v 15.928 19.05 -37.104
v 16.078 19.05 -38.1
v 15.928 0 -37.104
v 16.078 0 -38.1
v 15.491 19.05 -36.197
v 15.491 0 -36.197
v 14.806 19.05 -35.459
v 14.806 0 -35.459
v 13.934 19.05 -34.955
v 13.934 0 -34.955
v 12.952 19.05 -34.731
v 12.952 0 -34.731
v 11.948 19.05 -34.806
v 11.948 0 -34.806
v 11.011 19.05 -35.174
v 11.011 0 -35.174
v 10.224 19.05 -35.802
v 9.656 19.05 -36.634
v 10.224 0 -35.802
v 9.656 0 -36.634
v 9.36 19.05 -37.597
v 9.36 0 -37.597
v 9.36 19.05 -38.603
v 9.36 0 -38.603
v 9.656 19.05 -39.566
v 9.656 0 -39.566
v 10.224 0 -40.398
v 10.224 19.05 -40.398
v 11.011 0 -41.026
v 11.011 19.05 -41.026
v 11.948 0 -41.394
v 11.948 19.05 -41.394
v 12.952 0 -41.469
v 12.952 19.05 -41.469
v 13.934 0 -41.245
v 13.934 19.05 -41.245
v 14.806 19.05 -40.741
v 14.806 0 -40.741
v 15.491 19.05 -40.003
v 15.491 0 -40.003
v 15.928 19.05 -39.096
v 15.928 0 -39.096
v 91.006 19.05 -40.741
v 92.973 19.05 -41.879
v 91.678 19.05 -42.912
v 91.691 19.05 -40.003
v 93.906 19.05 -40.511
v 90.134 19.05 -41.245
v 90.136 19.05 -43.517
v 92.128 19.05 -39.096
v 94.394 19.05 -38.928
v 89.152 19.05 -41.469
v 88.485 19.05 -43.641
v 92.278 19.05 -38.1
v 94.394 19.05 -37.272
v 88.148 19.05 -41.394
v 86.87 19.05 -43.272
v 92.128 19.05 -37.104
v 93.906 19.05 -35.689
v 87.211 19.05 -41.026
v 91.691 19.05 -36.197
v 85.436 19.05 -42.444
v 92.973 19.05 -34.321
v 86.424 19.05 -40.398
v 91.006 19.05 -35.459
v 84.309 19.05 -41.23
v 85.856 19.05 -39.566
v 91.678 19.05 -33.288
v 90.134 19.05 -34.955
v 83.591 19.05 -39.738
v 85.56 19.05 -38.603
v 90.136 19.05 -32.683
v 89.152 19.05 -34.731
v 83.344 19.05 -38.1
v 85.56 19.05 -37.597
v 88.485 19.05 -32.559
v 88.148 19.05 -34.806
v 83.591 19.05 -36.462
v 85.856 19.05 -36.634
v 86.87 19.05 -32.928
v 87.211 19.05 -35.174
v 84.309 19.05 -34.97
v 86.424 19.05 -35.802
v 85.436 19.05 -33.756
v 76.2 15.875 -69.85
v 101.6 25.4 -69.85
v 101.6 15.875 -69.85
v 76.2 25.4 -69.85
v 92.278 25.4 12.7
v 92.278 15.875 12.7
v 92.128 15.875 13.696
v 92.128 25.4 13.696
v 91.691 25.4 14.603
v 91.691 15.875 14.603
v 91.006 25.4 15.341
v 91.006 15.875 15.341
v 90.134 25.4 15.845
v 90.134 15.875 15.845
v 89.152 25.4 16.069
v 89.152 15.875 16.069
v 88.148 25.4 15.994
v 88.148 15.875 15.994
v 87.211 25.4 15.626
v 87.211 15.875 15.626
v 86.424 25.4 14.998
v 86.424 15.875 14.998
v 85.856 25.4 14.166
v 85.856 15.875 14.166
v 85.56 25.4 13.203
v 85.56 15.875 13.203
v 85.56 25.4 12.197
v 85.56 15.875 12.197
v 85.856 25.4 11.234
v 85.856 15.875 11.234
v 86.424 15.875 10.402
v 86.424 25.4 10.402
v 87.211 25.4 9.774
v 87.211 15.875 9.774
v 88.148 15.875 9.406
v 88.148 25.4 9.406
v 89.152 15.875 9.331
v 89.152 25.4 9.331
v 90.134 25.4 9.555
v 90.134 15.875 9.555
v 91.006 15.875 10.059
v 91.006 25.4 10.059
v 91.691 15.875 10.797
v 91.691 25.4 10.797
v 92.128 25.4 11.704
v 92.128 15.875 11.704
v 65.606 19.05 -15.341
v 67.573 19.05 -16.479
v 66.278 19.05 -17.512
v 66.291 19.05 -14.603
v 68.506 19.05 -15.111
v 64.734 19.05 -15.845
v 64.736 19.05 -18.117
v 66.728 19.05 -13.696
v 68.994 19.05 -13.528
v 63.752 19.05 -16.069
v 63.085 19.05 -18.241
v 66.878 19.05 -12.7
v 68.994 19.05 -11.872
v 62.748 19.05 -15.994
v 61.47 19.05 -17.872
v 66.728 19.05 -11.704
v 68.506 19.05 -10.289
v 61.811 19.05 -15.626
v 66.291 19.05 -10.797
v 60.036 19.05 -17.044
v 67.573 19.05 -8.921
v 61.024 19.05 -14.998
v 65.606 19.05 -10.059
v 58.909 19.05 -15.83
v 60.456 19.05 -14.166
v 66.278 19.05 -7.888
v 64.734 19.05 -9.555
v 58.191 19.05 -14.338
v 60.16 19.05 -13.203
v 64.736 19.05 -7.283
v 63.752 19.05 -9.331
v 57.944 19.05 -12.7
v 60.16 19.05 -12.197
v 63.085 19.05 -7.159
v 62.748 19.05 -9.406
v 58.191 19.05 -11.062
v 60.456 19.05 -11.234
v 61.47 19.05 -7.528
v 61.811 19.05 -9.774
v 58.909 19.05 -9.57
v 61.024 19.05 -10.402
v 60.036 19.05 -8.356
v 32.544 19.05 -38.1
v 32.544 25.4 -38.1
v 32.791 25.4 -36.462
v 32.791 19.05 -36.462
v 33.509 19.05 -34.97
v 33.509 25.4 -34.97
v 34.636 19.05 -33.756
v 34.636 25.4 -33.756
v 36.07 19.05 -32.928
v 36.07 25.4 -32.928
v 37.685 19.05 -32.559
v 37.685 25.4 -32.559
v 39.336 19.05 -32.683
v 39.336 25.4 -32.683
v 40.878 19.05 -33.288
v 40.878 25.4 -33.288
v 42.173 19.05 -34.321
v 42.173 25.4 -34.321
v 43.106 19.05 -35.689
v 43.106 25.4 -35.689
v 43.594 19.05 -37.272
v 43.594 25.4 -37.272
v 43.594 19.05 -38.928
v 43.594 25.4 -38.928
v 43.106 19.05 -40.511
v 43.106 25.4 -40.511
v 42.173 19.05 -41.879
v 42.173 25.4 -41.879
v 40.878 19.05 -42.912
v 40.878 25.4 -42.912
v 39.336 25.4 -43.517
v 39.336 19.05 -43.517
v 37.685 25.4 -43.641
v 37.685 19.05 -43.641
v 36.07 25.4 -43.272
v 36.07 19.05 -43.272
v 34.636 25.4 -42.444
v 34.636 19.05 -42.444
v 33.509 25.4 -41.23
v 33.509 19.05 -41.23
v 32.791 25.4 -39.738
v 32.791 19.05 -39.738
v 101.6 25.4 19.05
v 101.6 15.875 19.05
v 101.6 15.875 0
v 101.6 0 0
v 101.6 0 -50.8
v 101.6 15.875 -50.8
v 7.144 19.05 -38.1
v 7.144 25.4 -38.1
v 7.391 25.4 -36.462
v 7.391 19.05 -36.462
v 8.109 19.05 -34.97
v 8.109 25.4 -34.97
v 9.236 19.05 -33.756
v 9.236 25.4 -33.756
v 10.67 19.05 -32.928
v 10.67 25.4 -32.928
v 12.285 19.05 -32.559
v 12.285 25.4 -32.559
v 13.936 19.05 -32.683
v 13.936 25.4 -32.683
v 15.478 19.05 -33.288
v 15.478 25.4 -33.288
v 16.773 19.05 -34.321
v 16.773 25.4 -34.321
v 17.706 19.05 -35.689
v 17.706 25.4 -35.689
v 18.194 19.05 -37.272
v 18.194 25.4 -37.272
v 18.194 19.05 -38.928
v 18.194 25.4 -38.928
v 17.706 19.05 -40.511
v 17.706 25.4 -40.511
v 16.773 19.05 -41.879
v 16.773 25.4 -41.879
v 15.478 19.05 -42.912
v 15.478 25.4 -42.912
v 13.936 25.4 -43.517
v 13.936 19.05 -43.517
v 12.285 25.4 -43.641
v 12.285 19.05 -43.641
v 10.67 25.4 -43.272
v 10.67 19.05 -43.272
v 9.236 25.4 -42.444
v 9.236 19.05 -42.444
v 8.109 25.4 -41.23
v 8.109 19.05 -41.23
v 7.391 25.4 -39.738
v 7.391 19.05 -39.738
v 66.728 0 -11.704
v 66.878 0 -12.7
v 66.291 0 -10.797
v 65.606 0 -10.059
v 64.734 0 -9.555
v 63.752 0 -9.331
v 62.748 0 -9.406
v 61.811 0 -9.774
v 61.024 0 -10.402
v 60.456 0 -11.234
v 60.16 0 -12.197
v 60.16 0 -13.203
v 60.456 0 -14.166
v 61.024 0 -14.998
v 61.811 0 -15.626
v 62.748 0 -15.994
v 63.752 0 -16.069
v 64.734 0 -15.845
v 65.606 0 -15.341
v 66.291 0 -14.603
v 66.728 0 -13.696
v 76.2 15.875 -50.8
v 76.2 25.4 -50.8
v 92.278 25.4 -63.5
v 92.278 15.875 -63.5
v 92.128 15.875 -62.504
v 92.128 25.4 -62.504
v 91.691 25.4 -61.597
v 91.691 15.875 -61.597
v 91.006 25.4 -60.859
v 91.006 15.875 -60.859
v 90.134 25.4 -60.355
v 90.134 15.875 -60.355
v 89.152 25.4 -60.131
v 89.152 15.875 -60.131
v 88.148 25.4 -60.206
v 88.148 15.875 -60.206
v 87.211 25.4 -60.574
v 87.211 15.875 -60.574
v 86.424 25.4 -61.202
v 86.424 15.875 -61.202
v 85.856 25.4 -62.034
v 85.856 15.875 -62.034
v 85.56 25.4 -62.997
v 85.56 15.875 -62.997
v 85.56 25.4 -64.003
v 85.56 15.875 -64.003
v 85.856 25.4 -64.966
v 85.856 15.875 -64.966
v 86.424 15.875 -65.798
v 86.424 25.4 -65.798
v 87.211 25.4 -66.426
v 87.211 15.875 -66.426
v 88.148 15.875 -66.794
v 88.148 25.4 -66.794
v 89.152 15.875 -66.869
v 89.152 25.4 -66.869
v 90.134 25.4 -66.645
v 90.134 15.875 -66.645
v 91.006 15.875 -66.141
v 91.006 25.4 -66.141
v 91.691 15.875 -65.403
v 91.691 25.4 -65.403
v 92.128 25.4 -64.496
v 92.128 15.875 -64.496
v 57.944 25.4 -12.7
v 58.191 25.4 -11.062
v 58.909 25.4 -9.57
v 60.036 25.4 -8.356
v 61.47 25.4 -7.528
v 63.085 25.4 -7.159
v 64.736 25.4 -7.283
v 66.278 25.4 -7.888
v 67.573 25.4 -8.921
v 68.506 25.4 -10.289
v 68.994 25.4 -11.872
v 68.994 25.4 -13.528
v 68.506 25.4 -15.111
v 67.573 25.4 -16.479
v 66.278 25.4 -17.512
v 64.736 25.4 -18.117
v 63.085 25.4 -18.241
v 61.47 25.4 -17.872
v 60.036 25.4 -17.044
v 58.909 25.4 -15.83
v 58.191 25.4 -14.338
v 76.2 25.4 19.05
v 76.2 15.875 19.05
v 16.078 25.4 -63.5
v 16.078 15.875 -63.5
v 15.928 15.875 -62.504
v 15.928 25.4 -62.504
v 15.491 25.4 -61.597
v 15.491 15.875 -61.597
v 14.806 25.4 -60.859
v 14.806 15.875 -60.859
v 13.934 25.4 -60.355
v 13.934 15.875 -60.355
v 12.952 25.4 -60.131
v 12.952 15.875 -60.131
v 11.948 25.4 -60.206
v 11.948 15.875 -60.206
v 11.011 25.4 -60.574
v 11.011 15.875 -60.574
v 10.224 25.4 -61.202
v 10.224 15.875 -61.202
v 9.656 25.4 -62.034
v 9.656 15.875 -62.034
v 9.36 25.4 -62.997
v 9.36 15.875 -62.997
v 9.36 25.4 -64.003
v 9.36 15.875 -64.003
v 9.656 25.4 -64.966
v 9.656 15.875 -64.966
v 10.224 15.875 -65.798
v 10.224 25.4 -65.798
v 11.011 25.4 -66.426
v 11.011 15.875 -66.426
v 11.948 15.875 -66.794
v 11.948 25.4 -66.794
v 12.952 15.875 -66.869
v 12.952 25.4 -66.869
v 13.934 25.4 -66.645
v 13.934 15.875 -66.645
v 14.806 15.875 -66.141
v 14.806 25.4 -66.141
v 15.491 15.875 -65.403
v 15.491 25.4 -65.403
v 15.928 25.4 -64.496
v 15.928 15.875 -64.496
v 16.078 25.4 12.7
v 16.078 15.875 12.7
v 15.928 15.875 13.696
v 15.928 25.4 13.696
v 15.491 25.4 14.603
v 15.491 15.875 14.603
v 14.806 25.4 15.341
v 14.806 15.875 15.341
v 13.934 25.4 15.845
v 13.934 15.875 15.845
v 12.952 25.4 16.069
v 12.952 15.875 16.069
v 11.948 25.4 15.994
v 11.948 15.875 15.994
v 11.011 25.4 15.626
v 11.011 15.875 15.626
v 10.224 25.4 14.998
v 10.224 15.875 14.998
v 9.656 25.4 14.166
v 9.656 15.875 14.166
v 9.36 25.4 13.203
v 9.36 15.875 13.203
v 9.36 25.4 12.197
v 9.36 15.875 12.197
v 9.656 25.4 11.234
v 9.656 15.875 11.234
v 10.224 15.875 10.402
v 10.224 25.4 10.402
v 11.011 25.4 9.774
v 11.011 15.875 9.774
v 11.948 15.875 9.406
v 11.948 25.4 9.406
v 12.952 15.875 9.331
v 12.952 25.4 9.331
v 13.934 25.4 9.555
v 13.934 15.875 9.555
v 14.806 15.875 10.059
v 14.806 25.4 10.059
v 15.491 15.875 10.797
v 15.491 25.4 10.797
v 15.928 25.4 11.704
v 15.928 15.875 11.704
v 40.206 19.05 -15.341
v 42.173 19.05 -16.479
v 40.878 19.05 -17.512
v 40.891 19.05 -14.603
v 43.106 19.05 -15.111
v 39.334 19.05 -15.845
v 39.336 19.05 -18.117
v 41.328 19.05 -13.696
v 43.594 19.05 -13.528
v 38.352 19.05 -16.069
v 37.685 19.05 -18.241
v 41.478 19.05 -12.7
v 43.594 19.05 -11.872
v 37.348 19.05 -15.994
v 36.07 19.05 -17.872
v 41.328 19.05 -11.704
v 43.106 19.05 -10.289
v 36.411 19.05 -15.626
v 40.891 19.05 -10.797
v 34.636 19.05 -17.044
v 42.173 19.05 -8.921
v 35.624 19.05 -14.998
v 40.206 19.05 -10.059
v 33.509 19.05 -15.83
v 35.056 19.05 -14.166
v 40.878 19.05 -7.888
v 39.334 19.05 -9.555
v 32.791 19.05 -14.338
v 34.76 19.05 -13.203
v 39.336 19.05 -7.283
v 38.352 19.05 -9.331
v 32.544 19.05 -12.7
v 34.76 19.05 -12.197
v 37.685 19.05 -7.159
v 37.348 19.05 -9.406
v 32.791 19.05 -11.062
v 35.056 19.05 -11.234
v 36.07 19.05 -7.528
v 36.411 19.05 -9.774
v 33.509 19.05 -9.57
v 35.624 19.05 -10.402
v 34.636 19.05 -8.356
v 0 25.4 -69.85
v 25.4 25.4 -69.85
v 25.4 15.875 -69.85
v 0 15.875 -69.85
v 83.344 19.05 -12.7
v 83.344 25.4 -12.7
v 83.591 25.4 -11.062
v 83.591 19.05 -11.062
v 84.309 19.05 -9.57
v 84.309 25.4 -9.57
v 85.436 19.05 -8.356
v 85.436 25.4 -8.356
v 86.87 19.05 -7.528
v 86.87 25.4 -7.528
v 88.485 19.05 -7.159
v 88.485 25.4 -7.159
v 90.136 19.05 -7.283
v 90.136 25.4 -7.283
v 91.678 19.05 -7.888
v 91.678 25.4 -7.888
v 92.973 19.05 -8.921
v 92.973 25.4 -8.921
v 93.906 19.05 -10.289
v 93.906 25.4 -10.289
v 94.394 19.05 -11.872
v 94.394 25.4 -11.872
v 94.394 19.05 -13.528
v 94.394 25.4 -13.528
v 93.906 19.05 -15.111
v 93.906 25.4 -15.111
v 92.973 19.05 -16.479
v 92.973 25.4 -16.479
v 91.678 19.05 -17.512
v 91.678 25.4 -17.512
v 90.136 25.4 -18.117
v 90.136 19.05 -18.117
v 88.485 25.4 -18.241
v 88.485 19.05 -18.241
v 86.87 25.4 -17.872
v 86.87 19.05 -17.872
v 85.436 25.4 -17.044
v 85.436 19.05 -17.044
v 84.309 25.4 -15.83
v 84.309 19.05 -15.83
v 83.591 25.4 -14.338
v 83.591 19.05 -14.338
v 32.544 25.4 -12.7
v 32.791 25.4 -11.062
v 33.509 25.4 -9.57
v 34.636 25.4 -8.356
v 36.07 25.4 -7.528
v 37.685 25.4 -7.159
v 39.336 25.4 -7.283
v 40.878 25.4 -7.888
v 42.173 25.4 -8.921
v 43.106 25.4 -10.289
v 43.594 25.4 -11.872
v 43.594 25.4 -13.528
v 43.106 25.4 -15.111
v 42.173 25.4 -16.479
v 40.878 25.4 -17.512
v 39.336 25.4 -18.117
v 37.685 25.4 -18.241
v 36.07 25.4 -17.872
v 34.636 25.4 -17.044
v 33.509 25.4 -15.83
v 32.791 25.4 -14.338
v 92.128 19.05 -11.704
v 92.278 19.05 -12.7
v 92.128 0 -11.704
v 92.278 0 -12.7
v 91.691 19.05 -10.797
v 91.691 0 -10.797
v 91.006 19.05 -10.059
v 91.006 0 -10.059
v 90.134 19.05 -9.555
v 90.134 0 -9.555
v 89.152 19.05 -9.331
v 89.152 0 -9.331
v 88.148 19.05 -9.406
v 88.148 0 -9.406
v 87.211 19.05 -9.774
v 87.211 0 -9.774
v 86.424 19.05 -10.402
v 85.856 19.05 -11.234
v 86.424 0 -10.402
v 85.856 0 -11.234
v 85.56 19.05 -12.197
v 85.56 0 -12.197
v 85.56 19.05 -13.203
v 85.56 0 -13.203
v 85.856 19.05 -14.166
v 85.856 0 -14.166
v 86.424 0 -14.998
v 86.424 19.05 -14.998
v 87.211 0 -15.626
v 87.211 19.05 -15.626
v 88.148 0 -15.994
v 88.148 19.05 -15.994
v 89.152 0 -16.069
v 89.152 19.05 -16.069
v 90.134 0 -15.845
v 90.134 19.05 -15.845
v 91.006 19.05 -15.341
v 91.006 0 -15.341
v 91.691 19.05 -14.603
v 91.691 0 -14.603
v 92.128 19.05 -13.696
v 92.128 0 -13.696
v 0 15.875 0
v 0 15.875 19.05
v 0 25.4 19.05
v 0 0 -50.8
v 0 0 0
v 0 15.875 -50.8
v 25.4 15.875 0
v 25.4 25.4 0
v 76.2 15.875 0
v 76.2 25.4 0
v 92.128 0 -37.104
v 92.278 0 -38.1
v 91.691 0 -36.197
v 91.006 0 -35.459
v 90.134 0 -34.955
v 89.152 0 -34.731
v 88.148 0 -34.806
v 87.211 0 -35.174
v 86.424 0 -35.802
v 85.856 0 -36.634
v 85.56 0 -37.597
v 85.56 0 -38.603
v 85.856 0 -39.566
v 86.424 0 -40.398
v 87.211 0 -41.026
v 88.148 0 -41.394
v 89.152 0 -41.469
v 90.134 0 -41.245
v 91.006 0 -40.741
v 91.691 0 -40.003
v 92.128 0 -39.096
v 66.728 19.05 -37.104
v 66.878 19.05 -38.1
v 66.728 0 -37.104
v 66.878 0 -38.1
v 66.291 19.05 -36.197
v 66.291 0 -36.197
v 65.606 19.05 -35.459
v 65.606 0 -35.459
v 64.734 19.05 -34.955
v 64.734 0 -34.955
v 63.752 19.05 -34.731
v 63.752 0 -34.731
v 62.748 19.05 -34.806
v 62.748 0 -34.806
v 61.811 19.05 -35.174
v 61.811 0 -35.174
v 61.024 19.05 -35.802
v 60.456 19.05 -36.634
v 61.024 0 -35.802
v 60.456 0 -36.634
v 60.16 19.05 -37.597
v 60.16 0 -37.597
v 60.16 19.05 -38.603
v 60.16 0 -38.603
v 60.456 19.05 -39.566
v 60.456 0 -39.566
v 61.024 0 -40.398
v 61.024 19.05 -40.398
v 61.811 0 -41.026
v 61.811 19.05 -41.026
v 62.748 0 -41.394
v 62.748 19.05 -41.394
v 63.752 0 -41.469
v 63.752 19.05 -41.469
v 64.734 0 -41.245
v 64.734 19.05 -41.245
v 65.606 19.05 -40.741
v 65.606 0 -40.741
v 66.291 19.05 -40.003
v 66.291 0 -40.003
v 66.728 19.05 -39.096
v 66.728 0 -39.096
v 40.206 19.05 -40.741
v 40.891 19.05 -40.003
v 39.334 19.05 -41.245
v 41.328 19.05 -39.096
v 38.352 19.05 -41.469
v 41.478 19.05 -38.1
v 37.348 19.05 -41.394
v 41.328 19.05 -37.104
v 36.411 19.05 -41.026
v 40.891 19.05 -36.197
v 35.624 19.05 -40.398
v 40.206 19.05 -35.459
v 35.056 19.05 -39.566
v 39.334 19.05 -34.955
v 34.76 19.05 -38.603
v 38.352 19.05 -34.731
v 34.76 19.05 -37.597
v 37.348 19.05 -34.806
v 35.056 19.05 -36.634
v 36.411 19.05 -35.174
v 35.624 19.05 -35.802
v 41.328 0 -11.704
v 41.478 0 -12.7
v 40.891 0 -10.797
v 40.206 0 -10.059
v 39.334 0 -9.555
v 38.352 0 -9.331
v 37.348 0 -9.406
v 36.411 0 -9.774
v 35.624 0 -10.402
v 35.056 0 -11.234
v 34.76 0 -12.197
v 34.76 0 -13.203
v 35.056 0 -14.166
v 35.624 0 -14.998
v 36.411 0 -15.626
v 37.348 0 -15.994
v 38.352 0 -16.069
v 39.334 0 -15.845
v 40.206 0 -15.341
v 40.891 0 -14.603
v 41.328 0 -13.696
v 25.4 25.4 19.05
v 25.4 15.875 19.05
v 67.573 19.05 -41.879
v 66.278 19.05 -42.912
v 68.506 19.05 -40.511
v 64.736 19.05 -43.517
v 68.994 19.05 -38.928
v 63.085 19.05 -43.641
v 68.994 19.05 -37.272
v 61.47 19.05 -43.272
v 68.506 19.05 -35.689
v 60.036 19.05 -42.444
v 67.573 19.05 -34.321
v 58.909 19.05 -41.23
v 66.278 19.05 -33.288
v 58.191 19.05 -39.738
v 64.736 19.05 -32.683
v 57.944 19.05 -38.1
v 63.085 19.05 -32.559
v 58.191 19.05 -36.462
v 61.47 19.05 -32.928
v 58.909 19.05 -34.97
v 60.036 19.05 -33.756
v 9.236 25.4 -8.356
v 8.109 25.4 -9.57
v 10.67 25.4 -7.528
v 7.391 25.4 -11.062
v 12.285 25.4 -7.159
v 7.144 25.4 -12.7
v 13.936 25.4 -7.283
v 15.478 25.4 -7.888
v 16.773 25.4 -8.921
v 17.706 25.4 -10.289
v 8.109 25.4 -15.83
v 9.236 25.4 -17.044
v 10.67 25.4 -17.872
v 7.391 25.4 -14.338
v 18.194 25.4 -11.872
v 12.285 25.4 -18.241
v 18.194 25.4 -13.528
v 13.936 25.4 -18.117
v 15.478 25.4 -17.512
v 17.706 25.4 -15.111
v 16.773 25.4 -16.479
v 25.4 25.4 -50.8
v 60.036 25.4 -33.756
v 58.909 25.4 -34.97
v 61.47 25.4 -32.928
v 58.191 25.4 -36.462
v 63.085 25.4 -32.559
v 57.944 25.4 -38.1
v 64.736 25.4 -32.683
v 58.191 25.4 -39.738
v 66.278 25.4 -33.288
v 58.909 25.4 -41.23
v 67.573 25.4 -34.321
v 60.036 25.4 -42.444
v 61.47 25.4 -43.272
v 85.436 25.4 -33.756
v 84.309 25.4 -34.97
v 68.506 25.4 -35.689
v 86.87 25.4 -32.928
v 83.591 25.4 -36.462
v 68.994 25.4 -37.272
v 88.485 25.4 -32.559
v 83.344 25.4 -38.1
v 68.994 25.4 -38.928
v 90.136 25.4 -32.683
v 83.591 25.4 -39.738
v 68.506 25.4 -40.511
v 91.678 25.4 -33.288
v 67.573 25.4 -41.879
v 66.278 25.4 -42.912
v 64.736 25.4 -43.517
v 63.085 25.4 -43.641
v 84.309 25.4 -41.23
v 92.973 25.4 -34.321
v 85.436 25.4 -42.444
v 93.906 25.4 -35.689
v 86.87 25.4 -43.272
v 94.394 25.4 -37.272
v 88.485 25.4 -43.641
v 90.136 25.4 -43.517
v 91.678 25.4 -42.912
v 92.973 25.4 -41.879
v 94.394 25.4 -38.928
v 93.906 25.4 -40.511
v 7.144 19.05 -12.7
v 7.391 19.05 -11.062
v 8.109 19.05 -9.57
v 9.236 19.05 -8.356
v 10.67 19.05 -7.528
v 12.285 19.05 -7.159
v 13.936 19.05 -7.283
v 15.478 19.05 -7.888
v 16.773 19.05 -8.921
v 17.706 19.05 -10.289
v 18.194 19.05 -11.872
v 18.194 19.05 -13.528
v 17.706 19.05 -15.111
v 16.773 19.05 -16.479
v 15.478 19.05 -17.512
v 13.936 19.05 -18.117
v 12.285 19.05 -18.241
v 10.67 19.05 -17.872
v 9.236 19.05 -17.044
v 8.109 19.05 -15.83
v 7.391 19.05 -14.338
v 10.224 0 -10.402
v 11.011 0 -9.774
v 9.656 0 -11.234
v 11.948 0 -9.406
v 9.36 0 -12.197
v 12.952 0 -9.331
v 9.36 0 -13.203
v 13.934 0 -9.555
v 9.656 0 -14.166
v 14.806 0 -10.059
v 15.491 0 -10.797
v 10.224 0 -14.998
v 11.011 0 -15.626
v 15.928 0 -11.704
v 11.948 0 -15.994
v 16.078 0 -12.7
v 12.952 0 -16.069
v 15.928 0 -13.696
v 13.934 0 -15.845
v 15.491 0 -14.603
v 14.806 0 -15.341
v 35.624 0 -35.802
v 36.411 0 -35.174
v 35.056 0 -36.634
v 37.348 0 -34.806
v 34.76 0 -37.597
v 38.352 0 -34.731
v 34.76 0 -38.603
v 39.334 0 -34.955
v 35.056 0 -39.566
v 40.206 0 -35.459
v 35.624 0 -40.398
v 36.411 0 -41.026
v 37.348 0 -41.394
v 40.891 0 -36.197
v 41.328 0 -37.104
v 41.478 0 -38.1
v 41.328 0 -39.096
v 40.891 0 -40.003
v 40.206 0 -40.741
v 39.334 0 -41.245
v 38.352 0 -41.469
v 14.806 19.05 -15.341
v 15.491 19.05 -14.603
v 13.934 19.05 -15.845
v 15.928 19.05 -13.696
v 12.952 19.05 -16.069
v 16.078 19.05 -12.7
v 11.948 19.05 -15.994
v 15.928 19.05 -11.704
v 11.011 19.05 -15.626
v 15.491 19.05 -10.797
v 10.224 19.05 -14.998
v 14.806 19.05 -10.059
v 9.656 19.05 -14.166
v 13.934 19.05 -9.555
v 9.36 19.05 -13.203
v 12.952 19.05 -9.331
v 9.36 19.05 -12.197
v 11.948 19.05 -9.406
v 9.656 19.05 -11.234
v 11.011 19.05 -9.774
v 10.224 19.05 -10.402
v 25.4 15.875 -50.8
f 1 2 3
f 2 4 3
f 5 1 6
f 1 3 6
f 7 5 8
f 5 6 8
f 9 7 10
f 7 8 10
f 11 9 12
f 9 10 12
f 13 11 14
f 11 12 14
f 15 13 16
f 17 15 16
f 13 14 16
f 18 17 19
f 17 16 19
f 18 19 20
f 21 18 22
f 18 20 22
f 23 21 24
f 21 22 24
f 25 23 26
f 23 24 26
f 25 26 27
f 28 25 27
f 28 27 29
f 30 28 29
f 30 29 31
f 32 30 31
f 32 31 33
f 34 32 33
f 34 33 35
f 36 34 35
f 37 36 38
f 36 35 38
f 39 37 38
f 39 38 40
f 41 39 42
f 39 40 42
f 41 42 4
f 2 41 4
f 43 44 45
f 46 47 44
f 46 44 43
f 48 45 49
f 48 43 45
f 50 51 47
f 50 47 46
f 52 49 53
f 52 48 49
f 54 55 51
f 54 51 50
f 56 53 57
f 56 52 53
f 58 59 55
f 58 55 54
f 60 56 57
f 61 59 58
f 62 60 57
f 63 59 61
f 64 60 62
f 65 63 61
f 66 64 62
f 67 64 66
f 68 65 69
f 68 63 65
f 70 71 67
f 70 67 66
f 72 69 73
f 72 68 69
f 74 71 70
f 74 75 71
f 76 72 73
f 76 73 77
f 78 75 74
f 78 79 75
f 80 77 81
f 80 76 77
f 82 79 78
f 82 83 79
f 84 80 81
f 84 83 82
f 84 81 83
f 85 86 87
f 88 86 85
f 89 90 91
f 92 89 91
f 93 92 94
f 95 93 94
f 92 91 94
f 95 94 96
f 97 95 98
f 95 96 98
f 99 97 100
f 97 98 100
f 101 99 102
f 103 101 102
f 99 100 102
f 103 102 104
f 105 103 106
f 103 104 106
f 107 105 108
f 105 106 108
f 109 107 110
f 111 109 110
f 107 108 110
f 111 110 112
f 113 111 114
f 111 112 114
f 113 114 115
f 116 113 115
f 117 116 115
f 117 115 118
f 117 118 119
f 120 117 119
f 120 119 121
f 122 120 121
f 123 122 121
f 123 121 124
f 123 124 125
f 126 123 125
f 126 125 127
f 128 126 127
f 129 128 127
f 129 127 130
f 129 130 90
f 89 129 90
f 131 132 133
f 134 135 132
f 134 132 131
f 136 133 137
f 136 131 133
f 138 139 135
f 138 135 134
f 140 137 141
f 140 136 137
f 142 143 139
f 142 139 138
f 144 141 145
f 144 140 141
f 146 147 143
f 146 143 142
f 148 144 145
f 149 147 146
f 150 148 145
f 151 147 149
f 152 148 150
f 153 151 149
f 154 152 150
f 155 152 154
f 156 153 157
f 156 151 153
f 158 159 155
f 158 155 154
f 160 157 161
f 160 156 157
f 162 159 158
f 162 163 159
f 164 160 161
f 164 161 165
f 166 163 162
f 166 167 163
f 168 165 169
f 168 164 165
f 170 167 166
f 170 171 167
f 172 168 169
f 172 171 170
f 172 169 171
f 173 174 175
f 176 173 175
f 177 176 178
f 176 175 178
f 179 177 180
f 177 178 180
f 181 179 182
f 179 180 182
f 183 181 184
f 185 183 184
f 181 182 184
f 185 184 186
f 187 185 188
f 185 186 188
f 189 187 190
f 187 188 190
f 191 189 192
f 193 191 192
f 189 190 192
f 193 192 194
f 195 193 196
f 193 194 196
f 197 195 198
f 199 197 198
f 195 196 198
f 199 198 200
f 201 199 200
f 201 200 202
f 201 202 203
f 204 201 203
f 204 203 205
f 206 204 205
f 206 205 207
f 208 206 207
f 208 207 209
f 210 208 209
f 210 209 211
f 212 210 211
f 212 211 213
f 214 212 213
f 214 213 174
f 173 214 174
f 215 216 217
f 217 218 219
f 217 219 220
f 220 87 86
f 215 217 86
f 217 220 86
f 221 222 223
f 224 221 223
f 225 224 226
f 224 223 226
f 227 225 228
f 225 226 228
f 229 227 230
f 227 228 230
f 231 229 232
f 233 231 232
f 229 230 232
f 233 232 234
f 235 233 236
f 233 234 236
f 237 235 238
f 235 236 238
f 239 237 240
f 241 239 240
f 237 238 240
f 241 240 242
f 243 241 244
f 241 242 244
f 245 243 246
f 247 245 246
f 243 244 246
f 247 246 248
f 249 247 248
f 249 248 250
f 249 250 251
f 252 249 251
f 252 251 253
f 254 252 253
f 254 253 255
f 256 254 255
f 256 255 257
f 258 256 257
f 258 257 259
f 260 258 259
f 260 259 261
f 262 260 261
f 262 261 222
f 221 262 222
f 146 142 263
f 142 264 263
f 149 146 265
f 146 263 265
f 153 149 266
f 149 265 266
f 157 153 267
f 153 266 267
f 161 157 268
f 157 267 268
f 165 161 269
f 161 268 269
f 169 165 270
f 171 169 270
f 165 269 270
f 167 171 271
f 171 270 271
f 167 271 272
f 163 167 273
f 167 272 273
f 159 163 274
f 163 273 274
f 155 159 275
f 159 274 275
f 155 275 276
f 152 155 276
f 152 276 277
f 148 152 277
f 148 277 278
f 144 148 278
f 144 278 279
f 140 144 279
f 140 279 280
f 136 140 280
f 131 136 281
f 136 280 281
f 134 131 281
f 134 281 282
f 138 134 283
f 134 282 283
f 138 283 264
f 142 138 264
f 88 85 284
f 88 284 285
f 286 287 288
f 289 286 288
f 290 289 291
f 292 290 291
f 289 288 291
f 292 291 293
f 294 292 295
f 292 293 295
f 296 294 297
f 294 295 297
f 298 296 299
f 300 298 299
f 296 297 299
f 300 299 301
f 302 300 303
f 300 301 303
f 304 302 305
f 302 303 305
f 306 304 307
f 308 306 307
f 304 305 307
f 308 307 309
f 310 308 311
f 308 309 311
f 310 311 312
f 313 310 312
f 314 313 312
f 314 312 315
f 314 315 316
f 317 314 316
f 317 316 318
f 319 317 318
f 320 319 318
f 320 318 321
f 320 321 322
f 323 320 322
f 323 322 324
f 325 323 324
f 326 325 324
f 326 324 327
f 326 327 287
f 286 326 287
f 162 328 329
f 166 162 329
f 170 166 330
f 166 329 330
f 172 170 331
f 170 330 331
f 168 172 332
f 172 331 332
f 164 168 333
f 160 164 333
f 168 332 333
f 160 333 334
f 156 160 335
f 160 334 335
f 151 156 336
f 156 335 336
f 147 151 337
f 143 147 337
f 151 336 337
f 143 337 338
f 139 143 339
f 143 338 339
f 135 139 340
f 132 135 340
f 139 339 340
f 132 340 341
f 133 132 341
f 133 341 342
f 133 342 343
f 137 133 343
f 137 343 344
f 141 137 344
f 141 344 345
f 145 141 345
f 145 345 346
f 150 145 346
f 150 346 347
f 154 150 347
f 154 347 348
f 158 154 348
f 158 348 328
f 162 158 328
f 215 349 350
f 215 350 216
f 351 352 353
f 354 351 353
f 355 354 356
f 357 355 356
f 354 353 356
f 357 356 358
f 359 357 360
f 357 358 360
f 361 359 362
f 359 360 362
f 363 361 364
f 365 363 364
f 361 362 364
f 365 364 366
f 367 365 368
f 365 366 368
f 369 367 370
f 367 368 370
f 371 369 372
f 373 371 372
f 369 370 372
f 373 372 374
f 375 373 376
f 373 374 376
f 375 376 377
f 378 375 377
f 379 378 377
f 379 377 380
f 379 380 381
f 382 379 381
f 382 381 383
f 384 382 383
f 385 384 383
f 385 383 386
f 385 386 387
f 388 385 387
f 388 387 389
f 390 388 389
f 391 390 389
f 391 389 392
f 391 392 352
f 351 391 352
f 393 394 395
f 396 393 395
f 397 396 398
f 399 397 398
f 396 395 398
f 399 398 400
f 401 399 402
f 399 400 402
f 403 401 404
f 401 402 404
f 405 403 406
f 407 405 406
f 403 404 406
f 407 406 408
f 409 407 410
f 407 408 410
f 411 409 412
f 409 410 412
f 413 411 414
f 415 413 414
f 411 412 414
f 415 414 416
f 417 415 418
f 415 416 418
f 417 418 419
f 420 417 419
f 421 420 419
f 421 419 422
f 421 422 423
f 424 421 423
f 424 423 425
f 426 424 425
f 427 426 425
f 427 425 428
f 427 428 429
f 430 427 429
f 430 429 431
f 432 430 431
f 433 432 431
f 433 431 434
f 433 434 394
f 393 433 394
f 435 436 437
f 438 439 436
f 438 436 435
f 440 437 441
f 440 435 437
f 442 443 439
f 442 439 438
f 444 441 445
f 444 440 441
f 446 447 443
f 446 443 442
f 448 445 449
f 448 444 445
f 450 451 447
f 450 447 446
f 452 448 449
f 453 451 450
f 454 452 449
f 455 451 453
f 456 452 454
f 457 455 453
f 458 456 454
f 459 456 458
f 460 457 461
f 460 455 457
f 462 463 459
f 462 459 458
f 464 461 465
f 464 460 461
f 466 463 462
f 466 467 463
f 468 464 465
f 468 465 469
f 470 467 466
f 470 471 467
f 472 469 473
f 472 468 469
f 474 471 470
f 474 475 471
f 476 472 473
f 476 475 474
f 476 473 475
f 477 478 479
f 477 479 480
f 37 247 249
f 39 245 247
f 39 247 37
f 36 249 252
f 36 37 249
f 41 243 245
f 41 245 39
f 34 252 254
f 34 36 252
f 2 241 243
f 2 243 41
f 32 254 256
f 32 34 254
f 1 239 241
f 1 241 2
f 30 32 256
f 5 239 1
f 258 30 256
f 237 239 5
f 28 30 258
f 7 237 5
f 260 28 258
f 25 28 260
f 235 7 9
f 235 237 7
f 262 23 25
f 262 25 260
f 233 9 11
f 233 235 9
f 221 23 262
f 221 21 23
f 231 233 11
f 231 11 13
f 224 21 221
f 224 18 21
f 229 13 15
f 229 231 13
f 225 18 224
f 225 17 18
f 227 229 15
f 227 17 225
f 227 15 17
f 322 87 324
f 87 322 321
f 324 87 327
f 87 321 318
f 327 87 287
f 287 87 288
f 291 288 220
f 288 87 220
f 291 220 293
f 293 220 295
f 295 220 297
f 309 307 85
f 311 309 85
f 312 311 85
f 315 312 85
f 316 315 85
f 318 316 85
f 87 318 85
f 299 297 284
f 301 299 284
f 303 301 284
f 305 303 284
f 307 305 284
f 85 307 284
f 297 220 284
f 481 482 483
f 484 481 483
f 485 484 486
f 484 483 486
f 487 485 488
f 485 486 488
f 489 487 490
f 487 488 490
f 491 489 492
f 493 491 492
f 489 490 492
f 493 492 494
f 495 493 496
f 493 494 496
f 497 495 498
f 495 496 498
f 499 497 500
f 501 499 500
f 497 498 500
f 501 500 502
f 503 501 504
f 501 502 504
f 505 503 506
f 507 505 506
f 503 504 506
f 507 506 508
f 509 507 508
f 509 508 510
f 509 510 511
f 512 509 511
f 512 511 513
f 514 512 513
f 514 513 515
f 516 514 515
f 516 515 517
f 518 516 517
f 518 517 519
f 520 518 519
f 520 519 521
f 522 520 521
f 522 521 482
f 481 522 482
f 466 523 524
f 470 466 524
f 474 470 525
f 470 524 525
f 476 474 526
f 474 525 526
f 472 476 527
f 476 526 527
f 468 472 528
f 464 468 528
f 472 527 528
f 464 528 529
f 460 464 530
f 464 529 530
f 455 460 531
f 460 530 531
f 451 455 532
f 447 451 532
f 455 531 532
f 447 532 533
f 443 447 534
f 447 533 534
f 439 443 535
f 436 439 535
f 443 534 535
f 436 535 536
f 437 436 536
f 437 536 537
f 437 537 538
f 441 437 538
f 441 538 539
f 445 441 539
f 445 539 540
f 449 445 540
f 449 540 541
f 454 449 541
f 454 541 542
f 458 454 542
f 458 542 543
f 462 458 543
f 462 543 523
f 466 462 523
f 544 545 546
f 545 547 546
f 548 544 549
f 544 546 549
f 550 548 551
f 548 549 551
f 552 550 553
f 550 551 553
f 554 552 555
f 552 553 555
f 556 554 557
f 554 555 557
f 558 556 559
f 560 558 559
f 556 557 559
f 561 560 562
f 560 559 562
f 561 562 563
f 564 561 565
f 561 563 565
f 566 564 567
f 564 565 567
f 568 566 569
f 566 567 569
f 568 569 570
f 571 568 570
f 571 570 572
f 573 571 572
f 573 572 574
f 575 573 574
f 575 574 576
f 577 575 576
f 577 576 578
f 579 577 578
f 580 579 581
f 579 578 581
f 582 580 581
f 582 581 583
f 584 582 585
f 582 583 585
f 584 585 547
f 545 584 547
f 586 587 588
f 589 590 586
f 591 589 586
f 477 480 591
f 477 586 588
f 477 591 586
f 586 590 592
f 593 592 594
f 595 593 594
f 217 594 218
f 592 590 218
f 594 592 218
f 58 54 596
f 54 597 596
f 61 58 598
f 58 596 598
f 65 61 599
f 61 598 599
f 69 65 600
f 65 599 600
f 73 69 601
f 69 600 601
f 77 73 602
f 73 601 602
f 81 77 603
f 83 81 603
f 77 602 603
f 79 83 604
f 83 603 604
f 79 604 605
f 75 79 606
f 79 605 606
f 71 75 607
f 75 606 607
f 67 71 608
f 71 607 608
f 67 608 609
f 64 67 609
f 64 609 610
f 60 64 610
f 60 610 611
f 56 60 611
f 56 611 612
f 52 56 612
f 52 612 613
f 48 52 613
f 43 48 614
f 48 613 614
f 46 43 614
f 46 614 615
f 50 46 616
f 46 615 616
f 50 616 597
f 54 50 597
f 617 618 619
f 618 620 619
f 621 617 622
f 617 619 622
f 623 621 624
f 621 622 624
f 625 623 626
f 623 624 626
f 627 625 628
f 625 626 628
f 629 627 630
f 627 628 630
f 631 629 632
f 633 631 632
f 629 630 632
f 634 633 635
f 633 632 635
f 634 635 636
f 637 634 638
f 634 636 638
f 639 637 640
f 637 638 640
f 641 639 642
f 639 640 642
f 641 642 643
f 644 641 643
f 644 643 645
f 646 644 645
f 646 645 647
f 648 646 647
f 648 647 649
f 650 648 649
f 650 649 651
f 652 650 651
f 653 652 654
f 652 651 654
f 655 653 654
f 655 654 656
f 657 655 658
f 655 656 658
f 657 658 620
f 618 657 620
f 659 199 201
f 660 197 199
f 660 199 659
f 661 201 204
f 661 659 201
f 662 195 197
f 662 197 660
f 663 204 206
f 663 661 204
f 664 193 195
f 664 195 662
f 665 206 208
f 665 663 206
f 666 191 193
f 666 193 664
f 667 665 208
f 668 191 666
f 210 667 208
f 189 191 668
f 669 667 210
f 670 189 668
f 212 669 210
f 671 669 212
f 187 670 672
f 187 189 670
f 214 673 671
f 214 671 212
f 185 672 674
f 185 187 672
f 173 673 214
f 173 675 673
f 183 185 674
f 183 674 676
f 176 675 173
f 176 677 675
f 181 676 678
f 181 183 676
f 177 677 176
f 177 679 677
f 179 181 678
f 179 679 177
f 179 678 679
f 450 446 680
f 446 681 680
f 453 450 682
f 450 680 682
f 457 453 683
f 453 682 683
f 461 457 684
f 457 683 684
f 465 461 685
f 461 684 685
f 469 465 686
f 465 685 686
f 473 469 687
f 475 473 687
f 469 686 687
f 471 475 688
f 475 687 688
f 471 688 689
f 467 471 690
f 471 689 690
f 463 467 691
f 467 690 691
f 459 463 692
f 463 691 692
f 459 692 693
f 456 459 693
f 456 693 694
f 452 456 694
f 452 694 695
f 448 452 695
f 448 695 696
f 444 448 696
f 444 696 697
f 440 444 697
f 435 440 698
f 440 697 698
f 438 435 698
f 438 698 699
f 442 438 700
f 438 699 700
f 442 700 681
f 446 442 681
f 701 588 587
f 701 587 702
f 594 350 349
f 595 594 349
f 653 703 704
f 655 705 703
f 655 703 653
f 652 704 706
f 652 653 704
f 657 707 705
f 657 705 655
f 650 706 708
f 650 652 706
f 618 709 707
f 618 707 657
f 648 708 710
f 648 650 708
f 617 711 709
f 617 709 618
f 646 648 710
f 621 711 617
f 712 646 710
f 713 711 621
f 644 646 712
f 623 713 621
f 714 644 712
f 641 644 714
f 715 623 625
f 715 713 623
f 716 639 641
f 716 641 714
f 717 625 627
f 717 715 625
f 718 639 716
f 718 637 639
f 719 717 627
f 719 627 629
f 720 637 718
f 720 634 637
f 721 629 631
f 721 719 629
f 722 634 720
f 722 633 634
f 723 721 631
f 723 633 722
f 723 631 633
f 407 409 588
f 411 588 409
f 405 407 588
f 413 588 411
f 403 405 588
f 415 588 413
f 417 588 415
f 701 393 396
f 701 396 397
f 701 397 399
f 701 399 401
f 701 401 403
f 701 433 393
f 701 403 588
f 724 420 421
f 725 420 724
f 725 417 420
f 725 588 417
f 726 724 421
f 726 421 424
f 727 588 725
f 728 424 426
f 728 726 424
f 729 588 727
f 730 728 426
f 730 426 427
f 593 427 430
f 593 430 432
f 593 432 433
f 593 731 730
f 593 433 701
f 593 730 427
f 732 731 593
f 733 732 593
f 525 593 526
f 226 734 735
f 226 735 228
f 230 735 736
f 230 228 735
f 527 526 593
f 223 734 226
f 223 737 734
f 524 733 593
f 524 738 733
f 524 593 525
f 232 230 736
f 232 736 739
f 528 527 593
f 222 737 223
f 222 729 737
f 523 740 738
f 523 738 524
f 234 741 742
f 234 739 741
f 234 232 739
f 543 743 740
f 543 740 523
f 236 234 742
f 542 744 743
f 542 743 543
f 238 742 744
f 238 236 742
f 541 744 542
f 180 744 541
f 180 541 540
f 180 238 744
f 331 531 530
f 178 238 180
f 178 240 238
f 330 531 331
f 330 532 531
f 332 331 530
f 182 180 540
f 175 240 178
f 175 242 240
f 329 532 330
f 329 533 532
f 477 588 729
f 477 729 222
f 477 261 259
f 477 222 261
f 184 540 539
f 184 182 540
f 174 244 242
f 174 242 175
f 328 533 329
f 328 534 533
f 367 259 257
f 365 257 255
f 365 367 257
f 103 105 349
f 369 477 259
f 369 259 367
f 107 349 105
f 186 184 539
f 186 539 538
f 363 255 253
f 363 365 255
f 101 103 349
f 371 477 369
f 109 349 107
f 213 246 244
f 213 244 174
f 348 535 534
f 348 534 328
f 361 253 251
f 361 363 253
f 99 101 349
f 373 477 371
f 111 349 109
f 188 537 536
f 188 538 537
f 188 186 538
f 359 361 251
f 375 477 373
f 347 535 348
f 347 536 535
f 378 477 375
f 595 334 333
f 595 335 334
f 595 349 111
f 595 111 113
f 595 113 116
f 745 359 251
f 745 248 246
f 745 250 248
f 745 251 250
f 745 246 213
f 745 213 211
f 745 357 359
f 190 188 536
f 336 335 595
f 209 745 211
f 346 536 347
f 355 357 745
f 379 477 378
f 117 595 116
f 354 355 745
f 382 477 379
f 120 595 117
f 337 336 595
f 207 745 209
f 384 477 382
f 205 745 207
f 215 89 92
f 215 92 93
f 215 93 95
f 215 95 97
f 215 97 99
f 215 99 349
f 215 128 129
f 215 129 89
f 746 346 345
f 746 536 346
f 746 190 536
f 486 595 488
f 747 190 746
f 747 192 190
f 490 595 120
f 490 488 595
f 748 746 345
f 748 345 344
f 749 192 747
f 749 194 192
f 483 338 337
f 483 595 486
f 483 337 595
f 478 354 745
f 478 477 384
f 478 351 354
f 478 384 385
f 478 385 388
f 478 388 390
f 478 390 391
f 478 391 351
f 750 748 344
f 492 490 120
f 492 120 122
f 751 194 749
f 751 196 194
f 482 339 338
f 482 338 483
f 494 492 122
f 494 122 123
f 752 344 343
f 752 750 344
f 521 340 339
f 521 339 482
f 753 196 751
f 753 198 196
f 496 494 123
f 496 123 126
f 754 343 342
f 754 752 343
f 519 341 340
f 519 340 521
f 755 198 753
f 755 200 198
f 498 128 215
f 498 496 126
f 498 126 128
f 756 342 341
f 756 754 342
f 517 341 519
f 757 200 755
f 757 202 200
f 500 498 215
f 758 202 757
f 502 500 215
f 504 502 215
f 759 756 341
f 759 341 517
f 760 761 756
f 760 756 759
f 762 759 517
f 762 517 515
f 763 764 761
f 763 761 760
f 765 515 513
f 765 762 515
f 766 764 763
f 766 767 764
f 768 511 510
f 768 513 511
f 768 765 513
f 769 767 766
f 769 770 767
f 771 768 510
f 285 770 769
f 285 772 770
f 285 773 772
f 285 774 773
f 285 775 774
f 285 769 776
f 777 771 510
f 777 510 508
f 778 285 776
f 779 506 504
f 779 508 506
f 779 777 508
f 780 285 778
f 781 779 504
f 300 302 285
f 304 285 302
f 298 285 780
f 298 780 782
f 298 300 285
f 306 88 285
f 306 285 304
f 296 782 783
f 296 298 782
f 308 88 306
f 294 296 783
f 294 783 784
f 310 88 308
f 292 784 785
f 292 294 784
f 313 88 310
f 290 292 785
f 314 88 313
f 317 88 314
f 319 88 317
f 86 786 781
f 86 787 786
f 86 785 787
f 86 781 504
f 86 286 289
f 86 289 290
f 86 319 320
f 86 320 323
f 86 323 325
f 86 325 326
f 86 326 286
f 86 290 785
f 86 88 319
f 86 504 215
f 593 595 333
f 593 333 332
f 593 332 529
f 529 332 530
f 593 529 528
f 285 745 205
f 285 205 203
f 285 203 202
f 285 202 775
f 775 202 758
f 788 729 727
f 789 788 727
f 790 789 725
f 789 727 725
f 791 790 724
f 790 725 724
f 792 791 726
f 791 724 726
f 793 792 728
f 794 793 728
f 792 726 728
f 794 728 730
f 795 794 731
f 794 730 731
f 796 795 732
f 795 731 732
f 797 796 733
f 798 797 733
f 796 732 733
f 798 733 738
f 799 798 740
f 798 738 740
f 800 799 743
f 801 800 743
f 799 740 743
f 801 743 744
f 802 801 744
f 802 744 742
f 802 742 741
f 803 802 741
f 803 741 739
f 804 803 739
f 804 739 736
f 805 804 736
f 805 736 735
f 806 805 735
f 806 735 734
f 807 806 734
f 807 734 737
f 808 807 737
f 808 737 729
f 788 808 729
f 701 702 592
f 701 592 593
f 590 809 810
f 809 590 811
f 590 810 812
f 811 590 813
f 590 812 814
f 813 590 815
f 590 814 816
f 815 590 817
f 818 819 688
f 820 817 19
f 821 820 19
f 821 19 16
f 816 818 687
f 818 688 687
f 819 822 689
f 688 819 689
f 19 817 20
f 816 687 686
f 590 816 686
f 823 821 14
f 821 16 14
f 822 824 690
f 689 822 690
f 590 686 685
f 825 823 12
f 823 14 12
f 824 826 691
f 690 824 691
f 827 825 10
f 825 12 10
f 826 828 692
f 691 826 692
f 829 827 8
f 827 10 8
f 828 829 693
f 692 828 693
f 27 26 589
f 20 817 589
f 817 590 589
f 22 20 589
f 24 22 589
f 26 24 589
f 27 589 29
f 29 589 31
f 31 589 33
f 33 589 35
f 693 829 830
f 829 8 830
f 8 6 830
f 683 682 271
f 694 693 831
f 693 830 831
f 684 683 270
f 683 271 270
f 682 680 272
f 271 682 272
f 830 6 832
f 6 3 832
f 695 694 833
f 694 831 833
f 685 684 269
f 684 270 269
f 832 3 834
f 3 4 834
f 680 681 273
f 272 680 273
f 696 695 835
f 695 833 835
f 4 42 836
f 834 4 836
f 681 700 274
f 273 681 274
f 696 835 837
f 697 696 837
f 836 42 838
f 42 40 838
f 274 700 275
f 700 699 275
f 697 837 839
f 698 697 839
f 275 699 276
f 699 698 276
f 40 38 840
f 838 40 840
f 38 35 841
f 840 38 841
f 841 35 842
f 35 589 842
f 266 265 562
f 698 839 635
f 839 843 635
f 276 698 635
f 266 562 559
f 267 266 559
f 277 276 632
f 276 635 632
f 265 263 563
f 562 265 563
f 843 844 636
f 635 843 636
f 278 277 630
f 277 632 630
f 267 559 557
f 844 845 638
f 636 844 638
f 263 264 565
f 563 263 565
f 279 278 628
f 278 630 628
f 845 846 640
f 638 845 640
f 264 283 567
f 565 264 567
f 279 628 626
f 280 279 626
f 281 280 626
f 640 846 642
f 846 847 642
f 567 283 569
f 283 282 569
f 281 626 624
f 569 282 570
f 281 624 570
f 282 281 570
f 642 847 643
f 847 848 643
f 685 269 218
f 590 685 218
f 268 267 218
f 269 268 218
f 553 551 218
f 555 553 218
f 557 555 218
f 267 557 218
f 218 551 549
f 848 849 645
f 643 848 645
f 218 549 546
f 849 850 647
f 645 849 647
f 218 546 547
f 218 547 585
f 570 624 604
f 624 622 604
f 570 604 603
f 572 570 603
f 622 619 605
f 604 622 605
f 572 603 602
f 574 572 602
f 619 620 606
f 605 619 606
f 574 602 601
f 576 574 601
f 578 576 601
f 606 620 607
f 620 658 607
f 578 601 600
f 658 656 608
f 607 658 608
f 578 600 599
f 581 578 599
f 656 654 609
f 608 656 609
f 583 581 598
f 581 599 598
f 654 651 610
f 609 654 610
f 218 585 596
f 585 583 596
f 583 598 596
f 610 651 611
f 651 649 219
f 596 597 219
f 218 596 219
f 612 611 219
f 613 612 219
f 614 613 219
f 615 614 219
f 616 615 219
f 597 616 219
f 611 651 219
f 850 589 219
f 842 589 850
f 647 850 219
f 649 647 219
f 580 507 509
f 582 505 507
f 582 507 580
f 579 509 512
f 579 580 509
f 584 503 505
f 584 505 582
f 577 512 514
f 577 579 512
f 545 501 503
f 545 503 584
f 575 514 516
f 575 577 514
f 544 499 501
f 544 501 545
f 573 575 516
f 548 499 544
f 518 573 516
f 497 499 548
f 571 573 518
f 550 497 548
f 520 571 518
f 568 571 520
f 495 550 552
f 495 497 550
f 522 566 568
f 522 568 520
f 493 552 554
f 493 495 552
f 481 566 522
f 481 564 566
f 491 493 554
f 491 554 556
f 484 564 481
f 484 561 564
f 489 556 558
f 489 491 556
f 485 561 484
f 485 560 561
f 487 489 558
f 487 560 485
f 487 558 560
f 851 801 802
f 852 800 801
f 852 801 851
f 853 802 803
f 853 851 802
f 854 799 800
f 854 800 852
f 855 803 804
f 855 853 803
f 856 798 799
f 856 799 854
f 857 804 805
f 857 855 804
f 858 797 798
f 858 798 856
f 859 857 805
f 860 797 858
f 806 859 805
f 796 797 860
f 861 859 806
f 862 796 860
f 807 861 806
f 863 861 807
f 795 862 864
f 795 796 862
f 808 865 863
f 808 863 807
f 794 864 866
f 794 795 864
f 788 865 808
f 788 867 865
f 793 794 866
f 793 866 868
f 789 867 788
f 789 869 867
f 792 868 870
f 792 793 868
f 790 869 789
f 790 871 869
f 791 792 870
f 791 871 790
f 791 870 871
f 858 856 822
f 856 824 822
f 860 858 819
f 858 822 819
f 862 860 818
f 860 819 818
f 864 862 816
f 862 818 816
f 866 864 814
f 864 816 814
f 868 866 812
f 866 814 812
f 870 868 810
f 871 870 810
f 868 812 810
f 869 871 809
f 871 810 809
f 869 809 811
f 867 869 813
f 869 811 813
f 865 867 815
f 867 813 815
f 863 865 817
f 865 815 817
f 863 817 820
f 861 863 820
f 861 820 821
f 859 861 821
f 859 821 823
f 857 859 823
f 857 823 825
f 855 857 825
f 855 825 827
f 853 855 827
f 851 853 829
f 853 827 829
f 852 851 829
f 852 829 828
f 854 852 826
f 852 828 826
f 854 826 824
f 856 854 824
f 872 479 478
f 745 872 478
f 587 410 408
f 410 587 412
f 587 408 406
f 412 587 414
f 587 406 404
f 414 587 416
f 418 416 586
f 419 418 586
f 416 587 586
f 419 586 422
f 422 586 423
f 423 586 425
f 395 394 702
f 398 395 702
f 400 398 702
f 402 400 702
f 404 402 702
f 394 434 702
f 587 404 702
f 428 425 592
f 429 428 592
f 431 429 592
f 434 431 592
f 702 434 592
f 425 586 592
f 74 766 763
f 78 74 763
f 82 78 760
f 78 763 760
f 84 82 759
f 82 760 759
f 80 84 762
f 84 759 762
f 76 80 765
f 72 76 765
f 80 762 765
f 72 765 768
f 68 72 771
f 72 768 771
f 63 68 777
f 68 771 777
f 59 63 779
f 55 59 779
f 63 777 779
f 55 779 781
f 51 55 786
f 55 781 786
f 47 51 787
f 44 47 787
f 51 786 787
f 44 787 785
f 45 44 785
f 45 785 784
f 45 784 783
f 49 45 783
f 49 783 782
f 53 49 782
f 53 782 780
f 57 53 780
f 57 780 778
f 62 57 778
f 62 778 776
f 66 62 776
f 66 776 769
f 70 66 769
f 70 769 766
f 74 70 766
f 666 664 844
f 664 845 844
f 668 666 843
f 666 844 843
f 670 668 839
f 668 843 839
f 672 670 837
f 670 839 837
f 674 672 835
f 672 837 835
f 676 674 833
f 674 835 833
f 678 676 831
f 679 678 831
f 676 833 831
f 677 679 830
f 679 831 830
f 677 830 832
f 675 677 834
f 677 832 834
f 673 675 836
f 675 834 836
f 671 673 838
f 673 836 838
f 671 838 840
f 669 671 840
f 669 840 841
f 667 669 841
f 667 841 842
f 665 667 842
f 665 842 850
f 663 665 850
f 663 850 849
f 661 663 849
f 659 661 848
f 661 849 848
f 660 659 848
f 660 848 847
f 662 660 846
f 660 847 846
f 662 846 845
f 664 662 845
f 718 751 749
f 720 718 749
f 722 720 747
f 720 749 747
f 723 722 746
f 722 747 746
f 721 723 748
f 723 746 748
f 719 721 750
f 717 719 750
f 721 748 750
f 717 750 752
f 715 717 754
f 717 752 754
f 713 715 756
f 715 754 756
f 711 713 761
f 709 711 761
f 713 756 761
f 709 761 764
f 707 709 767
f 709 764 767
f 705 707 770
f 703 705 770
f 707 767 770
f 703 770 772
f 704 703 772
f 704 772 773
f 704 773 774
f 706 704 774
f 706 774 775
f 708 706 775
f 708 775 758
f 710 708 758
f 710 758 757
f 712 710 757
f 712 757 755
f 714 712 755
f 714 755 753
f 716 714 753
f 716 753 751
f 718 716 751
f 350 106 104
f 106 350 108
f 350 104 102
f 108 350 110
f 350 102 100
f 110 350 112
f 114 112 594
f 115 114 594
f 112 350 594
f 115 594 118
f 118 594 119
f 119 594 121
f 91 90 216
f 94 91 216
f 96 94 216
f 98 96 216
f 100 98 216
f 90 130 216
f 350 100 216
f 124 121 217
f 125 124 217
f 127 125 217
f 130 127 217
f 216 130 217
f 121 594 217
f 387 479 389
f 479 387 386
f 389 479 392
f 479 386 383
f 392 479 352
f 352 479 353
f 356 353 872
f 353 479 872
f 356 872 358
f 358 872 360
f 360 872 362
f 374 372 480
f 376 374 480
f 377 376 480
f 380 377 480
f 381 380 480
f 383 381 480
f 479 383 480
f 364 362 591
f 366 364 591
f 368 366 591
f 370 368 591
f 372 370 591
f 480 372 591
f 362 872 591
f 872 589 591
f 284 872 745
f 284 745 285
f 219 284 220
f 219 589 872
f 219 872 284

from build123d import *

# Parameters (mm, degrees)
SKETCH1_W                                        = 101.6
SKETCH1_H                                        = 50.8
BOSS_EXTRUDE1_DEPTH                              = 25.4
CBORE_FOR_1_4_SOCKET_HEAD_CAP_SCREW1_D           = 6.7564
CBORE_FOR_1_4_SOCKET_HEAD_CAP_SCREW1_CBORE_D     = 11.1125
CBORE_FOR_1_4_SOCKET_HEAD_CAP_SCREW1_CBORE_DEPTH = 6.35
LPATTERN1_COUNT                                  = 2
LPATTERN1_PITCH                                  = 25.4
LPATTERN1_COUNT_DIR2                             = 4
LPATTERN1_PITCH_DIR2                             = 25.4
F_1_4_CLEARANCE_HOLE1_D                          = 6.7564
LPATTERN2_COUNT                                  = 4
LPATTERN2_PITCH                                  = 25.4
SKETCH7_W                                        = 101.6
SKETCH7_H                                        = 9.525
BOSS_EXTRUDE2_DEPTH                              = 19.05
LPATTERN3_COUNT                                  = 2
LPATTERN3_PITCH                                  = 25.4
LPATTERN4_COPY_1_D                               = 6.7564
LPATTERN4_COPY_2_D                               = 6.7564
SKETCH11_W                                       = 101.6
SKETCH11_H                                       = 9.525
BOSS_EXTRUDE3_DEPTH                              = 19.05
SKETCH8_W                                        = 50.8
SKETCH8_H                                        = 9.525
CUT_EXTRUDE1_DEPTH                               = 19.05
SKETCH12_W                                       = 50.8
SKETCH12_H                                       = 9.525
CUT_EXTRUDE2_DEPTH                               = 19.05
LPATTERN5_COUNT                                  = 2
LPATTERN5_PITCH                                  = 50.8
LPATTERN5_COUNT_DIR2                             = 2
LPATTERN5_PITCH_DIR2                             = 76.2


with BuildPart() as part:
    # Sketch1 → Boss-Extrude1 (new body)
    with BuildSketch(Plane(origin=(0, 0, 0), x_dir=(1, 0, 0), z_dir=(0, 1, 0))):
        with Locations((50.8, 25.4)):
            Rectangle(SKETCH1_W, SKETCH1_H)
    extrude(amount=BOSS_EXTRUDE1_DEPTH)

    # CBORE for 1/4 Socket Head Cap Screw1 (through all)
    with Locations(Plane(origin=(0, 25.4, 0), x_dir=(-1, 0, 0), z_dir=(0, 1, 0))):
        with Locations((-12.7, -12.7)):
            cbore_for_1_4_socket_head_cap_screw1 = CounterBoreHole(CBORE_FOR_1_4_SOCKET_HEAD_CAP_SCREW1_D / 2, CBORE_FOR_1_4_SOCKET_HEAD_CAP_SCREW1_CBORE_D / 2, CBORE_FOR_1_4_SOCKET_HEAD_CAP_SCREW1_CBORE_DEPTH)

    # LPattern1: CBORE for 1_4 Socket Head Cap Screw1 2 × 4
    with Locations(*[(j * LPATTERN1_PITCH_DIR2, 0, -i * LPATTERN1_PITCH) for i in range(LPATTERN1_COUNT) for j in range(LPATTERN1_COUNT_DIR2) if (i, j) != (0, 0)]):
        add(cbore_for_1_4_socket_head_cap_screw1, mode=Mode.SUBTRACT)

    # 1/4 Clearance Hole1 (through all)
    with Locations(Plane(origin=(0, 25.4, 0), x_dir=(-1, 0, 0), z_dir=(0, 1, 0))):
        with Locations((-12.7, -38.1)):
            f_1_4_clearance_hole1 = Hole(F_1_4_CLEARANCE_HOLE1_D / 2)

    # LPattern2: 1/4 Clearance Hole1 ×4
    with Locations(*[(-i * LPATTERN2_PITCH, 0, 0) for i in range(1, LPATTERN2_COUNT)]):
        add(f_1_4_clearance_hole1, mode=Mode.SUBTRACT)

    # Sketch7 → Boss-Extrude2 (add)
    with BuildSketch(Plane(origin=(0, 0, -50.8), x_dir=(-1, 0, 0), z_dir=(0, 0, -1))):
        with Locations((-50.8, 20.6375)):
            Rectangle(SKETCH7_W, SKETCH7_H)
    extrude(amount=BOSS_EXTRUDE2_DEPTH)

    # LPattern3: 1/4 Clearance Hole1 ×2
    with Locations(*[(0, 0, -i * LPATTERN3_PITCH) for i in range(1, LPATTERN3_COUNT)]):
        add(f_1_4_clearance_hole1, mode=Mode.SUBTRACT)

    # LPattern4 copy 1 (through all)
    with Locations(Plane(origin=(76.2, 25.4, -25.4), x_dir=(-1, 0, 0), z_dir=(0, 1, 0))):
        with Locations((-12.7, -38.1)):
            Hole(LPATTERN4_COPY_1_D / 2)

    # LPattern4 copy 2 (through all)
    with Locations(Plane(origin=(76.2, 25.4, 0), x_dir=(-1, 0, 0), z_dir=(0, 1, 0))):
        with Locations((-12.7, -38.1)):
            Hole(LPATTERN4_COPY_2_D / 2)

    # Sketch11 → Boss-Extrude3 (add)
    with BuildSketch(Plane.XY):
        with Locations((50.8, 20.6375)):
            Rectangle(SKETCH11_W, SKETCH11_H)
    extrude(amount=BOSS_EXTRUDE3_DEPTH)

    # Sketch8 → Cut-Extrude1 (cut)
    with BuildSketch(Plane(origin=(0, 0, -69.85), x_dir=(-1, 0, 0), z_dir=(0, 0, -1))):
        with Locations((-50.8, 20.6375)):
            Rectangle(SKETCH8_W, SKETCH8_H)
    extrude(amount=-CUT_EXTRUDE1_DEPTH, mode=Mode.SUBTRACT)

    # Sketch12 → Cut-Extrude2 (cut)
    with BuildSketch(Plane.XY.offset(19.05)):
        with Locations((50.8, 20.6375)):
            Rectangle(SKETCH12_W, SKETCH12_H)
    extrude(amount=-CUT_EXTRUDE2_DEPTH, mode=Mode.SUBTRACT)

    # LPattern5: 1_4 Clearance Hole1 2 × 2
    with Locations(*[(j * LPATTERN5_PITCH_DIR2, 0, i * LPATTERN5_PITCH) for i in range(LPATTERN5_COUNT) for j in range(LPATTERN5_COUNT_DIR2) if (i, j) != (0, 0)]):
        add(f_1_4_clearance_hole1, mode=Mode.SUBTRACT)


solid = part.part
